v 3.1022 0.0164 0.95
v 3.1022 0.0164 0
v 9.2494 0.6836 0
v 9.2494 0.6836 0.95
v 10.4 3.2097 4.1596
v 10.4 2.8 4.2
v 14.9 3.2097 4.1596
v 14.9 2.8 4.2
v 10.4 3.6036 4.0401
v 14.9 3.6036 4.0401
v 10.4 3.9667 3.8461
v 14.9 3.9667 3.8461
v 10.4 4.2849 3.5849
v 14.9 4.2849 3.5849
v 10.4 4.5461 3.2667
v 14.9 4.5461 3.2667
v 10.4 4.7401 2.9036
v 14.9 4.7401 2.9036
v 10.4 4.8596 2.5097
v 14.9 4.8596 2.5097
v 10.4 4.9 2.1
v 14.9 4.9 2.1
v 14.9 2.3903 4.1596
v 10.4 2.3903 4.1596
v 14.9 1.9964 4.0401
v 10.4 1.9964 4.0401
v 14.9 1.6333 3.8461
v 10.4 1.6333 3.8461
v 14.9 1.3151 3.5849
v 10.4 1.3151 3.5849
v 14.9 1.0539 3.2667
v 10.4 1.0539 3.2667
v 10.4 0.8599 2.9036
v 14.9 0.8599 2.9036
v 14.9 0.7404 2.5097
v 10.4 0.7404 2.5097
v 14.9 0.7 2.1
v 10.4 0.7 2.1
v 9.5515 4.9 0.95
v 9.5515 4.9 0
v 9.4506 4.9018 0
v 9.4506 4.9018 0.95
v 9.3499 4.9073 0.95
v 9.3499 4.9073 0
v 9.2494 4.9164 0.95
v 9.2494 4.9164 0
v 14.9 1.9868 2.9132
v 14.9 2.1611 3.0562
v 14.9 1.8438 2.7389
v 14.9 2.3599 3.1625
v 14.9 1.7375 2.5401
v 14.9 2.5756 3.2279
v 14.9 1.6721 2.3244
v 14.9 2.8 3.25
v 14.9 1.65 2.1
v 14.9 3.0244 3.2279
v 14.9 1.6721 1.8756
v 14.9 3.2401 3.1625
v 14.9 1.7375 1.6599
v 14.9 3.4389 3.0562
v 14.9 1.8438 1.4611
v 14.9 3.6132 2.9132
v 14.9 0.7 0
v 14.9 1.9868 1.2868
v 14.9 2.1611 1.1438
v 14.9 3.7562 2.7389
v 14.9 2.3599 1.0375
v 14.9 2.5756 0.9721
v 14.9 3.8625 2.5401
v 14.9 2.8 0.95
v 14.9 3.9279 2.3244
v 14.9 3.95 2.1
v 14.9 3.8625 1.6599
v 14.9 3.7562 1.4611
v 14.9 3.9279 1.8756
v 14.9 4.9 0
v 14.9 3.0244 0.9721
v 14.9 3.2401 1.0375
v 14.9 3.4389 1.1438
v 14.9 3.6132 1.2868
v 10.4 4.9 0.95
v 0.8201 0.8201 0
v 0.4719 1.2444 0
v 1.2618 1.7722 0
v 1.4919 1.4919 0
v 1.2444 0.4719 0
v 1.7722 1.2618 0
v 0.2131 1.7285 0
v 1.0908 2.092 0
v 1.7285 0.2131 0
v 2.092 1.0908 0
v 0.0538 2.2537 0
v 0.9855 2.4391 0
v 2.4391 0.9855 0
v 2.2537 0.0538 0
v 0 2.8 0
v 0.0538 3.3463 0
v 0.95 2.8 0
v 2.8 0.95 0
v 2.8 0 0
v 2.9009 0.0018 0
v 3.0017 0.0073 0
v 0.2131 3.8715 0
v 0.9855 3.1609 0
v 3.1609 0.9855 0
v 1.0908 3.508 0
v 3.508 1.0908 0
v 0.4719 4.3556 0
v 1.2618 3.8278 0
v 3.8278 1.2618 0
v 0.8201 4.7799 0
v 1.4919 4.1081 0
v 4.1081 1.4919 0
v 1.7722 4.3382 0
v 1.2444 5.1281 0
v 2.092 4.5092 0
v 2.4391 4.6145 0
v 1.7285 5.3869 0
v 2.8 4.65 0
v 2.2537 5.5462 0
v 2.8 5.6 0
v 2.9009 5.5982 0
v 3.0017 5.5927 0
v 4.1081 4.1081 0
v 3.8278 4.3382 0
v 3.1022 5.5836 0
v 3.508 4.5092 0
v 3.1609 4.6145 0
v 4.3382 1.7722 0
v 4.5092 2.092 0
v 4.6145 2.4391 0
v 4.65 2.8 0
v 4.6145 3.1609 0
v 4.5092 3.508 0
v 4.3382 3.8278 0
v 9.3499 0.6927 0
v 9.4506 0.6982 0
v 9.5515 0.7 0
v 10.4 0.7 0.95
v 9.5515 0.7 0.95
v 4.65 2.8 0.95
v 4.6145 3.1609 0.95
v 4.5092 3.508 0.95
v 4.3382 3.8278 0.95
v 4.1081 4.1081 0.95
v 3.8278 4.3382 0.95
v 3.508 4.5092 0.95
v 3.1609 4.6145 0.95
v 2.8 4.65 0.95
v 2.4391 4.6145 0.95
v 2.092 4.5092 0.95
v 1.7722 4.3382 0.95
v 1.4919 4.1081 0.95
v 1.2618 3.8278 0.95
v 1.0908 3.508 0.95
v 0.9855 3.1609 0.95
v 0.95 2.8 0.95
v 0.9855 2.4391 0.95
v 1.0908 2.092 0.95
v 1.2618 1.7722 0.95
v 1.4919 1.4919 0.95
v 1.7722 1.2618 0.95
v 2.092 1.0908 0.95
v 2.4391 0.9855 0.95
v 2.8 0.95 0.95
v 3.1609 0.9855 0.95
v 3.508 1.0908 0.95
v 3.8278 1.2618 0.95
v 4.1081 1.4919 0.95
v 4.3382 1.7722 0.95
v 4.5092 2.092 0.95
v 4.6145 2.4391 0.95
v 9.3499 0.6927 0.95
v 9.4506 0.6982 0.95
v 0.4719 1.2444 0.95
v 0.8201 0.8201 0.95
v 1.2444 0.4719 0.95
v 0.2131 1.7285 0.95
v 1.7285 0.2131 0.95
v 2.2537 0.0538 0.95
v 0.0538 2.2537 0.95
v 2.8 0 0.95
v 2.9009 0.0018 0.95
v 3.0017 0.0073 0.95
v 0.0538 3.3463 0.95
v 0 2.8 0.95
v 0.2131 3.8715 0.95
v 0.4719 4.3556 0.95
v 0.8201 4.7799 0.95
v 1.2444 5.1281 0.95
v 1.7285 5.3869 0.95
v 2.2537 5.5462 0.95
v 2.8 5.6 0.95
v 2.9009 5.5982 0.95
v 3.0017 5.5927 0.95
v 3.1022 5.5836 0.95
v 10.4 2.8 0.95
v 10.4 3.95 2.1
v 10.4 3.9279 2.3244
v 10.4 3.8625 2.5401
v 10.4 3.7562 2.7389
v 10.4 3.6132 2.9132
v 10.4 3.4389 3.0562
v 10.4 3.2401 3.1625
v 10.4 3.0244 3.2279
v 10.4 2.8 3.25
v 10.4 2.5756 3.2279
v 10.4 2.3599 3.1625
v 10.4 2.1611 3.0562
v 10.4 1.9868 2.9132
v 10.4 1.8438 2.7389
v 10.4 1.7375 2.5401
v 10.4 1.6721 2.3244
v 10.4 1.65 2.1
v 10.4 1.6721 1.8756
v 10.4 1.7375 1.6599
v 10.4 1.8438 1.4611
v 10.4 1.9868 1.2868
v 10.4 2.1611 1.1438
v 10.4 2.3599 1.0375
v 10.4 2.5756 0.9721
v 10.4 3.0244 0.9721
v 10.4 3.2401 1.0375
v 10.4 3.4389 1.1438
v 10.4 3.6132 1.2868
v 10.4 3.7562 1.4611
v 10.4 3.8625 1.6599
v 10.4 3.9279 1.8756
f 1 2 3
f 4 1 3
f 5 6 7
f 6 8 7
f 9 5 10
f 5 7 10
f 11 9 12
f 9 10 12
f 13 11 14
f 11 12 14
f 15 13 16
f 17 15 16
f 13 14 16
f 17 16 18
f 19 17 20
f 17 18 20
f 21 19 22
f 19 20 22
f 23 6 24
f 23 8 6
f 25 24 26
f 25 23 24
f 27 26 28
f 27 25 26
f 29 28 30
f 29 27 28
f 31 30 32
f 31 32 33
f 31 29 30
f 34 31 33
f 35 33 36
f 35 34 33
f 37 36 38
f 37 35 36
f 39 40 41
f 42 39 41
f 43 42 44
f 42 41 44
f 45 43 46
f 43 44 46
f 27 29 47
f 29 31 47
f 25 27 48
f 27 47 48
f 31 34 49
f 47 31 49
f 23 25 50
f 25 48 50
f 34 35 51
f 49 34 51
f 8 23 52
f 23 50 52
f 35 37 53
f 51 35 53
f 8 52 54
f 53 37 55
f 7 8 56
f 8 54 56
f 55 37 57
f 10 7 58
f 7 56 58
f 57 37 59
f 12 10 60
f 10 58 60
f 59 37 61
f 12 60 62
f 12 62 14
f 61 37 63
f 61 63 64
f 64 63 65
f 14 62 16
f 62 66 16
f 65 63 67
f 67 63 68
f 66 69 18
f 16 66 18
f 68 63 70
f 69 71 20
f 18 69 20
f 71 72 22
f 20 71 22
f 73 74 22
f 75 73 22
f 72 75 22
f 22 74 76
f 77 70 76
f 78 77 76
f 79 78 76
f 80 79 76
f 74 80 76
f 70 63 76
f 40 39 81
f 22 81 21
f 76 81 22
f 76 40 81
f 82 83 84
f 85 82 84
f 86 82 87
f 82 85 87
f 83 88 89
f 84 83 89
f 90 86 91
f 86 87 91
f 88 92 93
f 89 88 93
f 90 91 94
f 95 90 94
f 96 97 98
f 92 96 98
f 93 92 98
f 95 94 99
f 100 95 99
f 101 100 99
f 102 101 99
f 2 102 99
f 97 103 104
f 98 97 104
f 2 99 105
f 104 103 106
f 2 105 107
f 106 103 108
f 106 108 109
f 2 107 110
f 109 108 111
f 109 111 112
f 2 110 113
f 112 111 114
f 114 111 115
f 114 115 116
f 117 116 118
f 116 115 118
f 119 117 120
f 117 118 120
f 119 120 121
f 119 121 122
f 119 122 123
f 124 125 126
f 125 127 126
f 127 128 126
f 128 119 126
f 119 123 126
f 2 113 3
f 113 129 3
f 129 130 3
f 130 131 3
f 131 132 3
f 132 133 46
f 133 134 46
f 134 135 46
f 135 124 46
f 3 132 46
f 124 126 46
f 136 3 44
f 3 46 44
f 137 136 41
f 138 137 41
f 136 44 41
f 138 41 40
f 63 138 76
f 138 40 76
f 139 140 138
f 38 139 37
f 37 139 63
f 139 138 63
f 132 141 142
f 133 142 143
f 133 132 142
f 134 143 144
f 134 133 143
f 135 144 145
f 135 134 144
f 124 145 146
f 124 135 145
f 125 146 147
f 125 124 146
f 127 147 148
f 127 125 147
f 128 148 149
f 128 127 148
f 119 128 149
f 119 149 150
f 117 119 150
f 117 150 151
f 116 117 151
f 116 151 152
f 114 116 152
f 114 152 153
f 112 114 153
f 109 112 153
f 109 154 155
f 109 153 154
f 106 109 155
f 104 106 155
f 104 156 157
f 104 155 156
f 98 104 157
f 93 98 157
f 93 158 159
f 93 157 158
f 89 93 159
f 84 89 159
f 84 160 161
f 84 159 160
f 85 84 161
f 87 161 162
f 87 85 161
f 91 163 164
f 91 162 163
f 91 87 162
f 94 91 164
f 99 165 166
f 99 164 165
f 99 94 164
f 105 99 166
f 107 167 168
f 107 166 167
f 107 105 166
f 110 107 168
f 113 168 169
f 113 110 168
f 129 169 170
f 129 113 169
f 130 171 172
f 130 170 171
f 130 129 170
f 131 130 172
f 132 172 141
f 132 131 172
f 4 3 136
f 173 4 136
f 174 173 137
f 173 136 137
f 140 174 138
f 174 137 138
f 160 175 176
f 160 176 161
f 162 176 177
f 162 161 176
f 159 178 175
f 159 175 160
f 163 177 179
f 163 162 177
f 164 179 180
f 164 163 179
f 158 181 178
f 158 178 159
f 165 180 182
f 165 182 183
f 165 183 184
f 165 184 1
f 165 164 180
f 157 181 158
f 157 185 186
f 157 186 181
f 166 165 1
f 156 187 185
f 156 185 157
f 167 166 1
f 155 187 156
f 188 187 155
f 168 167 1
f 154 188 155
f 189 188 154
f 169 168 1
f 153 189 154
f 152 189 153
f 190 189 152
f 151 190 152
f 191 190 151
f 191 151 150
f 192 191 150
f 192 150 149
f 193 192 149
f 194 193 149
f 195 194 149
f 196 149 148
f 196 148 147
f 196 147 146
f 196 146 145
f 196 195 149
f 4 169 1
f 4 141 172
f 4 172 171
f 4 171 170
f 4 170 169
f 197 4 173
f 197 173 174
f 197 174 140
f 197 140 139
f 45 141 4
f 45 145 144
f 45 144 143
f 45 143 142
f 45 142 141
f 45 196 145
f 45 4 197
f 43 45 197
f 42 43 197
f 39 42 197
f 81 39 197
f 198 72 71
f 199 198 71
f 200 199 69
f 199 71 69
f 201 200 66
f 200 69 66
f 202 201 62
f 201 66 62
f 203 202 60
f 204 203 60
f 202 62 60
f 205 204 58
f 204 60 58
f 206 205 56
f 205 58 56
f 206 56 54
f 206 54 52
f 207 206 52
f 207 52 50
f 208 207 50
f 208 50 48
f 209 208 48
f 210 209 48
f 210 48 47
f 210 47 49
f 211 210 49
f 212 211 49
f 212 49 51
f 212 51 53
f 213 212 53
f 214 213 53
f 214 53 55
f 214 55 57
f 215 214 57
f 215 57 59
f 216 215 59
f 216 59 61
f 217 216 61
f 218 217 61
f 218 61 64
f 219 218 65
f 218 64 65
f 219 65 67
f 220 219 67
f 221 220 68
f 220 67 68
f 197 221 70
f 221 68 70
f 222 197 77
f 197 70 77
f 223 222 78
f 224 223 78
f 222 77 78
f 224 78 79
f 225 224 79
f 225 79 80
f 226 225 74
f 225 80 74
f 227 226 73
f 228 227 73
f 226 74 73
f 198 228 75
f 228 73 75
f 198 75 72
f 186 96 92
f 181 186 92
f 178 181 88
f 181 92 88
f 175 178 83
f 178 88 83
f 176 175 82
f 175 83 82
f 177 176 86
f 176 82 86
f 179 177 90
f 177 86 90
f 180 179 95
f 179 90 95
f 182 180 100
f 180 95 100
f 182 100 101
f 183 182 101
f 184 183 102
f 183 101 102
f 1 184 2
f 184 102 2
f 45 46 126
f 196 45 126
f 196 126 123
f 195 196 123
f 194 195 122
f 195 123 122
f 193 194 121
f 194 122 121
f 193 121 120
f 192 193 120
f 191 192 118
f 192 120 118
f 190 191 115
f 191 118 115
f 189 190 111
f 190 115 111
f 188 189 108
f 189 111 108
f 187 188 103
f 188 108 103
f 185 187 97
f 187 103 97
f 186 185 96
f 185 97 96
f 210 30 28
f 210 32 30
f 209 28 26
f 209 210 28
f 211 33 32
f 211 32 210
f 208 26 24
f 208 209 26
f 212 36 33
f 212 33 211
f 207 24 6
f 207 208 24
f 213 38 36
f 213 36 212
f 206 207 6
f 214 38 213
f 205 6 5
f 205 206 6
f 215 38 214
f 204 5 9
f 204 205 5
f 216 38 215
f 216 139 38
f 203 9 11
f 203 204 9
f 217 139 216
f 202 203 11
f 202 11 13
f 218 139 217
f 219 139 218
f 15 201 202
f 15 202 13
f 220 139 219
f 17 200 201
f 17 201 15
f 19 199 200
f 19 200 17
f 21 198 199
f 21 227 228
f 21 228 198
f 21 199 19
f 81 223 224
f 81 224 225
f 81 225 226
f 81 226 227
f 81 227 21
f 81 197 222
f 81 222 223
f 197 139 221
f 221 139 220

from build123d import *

# Parameters (mm, degrees)
F0_R     = 1.85
F1_DEPTH = 0.95
F2_W     = 4.5
F2_H     = 4.2
F3_DEPTH = 3.25
F4_R     = 2.09999
F5_R     = 1.15
F6_DEPTH = 25


# Not quite as in the source:
# - a fillet or chamfer is up to 0.001 mm smaller than in the source, because OpenCascade refuses the exact size


with BuildPart() as f1:
    # F0 (on Top) → F1 (new body)
    with BuildSketch(Plane.XY):
        with BuildLine():
            Line((9.5515289224, 0.7), (14.9, 0.7))
            Line((14.9, 0.7), (14.9, 4.9))
            Line((14.9, 4.9), (10.4, 4.9))
            Line((10.4, 4.9), (9.5515289224, 4.9))
            ThreePointArc((9.5515289224, 4.9), (9.4002214052, 4.9040911969), (9.2493560516, 4.916352832))
            Line((9.2493560516, 4.916352832), (3.1021728708, 5.583647168))
            ThreePointArc((3.1021728708, 5.583647168), (2.9513075171, 5.5959088031), (2.8, 5.6))
            ThreePointArc((2.8, 5.6), (0.8201010127, 4.7798989873), (0, 2.8))
            ThreePointArc((0, 2.8), (0.8201010127, 0.8201010127), (2.8, 0))
            ThreePointArc((2.8, 0), (2.9513075171, 0.0040911969), (3.1021728708, 0.016352832))
            Line((3.1021728708, 0.016352832), (9.2493560516, 0.683647168))
            ThreePointArc((9.2493560516, 0.683647168), (9.4002214052, 0.6959088031), (9.5515289224, 0.7))
        make_face()
        with Locations((2.8, 2.8)):
            Circle(F0_R, mode=Mode.SUBTRACT)
    extrude(amount=F1_DEPTH)

    # F2 (on face) → F3 (join)
    with BuildSketch(Plane.XY.offset(0.95)):
        with Locations((12.65, 2.8)):
            Rectangle(F2_W, F2_H)
    extrude(amount=F3_DEPTH)

    # F4 (radius 2.1 in the source; OpenCascade refuses exactly that, so slightly less here)
    f4_edges = [f1.edges().sort_by_distance(p)[0] for p in [
        (12.65, 4.9, 4.2),
        (12.65, 0.7, 4.2),
    ]]
    fillet(f4_edges, radius=F4_R)

    # F5 (on face) → F6 (cut)
    with BuildSketch(Plane.YZ.offset(14.9)):
        with Locations((2.8, 2.1)):
            Circle(F5_R)
    extrude(amount=-F6_DEPTH, mode=Mode.SUBTRACT)


solid = f1.part
